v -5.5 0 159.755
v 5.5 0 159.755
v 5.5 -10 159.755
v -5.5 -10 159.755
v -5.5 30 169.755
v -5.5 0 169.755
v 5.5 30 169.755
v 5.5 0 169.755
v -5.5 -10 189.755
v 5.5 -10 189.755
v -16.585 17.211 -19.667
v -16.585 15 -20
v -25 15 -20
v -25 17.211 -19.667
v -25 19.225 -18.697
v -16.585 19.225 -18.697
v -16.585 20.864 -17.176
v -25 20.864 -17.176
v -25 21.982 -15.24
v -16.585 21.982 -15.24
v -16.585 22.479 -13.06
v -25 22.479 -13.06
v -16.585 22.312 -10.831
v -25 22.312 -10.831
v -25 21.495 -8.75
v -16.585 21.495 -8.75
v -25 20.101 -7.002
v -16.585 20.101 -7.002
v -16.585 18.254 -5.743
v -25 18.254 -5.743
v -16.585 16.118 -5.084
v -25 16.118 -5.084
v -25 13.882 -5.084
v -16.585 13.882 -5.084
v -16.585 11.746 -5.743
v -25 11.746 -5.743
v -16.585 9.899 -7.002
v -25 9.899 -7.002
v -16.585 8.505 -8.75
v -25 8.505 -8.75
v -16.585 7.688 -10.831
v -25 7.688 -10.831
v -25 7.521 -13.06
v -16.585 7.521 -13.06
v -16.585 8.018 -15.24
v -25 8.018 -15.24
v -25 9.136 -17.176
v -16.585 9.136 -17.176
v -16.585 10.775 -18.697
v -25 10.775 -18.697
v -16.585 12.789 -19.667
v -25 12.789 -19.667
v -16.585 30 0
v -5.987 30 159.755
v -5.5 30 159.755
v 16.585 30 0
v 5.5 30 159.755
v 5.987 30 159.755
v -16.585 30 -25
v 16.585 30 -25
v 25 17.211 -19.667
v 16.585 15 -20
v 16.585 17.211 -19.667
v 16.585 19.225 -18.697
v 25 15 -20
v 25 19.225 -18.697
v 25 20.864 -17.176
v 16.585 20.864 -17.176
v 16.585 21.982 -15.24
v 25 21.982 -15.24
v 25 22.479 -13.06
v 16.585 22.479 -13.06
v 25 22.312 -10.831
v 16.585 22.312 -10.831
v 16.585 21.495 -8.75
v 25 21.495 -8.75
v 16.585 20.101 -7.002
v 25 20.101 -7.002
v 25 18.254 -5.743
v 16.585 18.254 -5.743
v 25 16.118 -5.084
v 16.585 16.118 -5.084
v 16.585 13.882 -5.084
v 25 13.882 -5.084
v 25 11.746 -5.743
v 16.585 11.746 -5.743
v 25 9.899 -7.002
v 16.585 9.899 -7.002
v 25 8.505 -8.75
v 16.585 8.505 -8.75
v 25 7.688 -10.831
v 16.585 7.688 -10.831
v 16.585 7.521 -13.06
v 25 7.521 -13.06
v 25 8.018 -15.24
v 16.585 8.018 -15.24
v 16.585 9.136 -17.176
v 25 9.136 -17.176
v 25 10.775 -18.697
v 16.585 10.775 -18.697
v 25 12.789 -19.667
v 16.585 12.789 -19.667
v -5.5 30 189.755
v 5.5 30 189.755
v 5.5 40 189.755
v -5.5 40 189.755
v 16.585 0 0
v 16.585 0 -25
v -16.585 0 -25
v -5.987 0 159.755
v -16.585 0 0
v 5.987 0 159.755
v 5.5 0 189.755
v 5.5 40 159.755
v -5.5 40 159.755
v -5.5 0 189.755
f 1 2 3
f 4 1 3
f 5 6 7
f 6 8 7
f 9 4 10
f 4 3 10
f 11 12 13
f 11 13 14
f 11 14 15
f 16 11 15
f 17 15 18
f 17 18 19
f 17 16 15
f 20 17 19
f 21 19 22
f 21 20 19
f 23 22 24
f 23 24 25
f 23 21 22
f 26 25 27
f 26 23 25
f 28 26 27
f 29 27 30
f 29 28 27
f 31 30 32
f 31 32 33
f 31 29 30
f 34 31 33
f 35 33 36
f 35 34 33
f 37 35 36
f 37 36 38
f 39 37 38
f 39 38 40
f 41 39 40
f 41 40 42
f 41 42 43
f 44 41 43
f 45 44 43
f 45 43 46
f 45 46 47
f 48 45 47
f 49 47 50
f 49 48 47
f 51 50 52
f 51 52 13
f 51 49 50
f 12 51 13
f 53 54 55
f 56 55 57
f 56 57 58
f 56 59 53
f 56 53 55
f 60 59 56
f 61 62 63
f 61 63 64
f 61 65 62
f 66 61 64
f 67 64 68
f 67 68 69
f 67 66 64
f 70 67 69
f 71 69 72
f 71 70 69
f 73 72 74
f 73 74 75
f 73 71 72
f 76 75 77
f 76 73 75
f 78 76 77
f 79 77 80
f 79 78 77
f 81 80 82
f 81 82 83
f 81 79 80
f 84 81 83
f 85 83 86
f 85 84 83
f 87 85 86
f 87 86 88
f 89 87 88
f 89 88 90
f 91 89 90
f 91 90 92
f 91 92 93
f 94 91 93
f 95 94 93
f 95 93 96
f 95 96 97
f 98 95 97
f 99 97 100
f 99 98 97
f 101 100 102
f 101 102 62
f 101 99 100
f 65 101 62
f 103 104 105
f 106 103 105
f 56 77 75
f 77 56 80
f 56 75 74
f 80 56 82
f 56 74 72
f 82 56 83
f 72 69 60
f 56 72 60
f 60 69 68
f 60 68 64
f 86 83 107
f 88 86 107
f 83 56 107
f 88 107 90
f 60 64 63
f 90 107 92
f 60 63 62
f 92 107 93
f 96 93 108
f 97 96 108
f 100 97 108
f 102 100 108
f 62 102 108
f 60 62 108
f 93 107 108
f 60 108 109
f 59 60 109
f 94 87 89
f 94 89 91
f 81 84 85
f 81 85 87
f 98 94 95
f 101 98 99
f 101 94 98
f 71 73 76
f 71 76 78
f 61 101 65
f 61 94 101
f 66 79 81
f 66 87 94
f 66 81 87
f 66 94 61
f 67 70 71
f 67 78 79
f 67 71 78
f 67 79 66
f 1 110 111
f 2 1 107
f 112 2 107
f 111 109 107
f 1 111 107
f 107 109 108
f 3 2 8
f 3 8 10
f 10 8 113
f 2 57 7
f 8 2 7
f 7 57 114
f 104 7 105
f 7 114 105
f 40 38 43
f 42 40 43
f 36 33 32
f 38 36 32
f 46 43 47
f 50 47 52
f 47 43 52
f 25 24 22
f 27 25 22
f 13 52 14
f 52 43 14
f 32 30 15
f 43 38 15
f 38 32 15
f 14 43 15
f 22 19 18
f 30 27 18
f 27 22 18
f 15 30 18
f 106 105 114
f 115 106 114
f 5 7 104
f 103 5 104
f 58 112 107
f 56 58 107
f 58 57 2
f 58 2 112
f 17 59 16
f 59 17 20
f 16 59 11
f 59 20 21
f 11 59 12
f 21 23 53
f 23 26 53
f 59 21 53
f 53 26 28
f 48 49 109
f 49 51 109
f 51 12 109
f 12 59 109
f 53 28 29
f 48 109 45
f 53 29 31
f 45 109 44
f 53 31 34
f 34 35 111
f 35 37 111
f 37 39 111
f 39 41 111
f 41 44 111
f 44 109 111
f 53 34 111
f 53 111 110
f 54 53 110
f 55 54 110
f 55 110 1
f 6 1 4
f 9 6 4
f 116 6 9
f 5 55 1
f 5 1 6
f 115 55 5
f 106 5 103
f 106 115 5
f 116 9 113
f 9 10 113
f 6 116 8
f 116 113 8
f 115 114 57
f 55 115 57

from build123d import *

# Parameters (mm, degrees)
BOSS_EXTRUDE2_DEPTH = 30
SKETCH4_R           = 7.5
BOSS_EXTRUDE3_DEPTH = 25
BOSS_EXTRUDE4_DEPTH = 5.5


with BuildPart() as part:
    # Sketch1 → Boss-Extrude2 (new body)
    with BuildSketch(Plane(origin=(0, 0, 0), x_dir=(1, 0, 0), z_dir=(0, 1, 0))):
        Polygon((-16.585, 0), (-5.986840434, -159.755193945), (5.986840434, -159.755193945), (16.585, 0), (16.585, 25), (-16.585, 25), align=None)
    extrude(amount=BOSS_EXTRUDE2_DEPTH)

    # Sketch4 → Boss-Extrude3 (add, symmetric)
    with BuildSketch(Plane(origin=(0, 0, 0), x_dir=(0, 0, -1), z_dir=(1, 0, 0))):
        with Locations((12.5, 15)):
            Circle(SKETCH4_R)
    extrude(amount=BOSS_EXTRUDE3_DEPTH, both=True)

    # Sketch6 → Boss-Extrude4 (add, symmetric)
    with BuildSketch(Plane(origin=(0, 0, 0), x_dir=(0, 0, -1), z_dir=(1, 0, 0))):
        Polygon((-189.755193945, 40), (-159.755193945, 40), (-159.755193945, -10), (-189.755193945, -10), (-189.755193945, 0), (-169.755193945, 0), (-169.755193945, 30), (-189.755193945, 30), align=None)
    extrude(amount=BOSS_EXTRUDE4_DEPTH, both=True)


solid = part.part
